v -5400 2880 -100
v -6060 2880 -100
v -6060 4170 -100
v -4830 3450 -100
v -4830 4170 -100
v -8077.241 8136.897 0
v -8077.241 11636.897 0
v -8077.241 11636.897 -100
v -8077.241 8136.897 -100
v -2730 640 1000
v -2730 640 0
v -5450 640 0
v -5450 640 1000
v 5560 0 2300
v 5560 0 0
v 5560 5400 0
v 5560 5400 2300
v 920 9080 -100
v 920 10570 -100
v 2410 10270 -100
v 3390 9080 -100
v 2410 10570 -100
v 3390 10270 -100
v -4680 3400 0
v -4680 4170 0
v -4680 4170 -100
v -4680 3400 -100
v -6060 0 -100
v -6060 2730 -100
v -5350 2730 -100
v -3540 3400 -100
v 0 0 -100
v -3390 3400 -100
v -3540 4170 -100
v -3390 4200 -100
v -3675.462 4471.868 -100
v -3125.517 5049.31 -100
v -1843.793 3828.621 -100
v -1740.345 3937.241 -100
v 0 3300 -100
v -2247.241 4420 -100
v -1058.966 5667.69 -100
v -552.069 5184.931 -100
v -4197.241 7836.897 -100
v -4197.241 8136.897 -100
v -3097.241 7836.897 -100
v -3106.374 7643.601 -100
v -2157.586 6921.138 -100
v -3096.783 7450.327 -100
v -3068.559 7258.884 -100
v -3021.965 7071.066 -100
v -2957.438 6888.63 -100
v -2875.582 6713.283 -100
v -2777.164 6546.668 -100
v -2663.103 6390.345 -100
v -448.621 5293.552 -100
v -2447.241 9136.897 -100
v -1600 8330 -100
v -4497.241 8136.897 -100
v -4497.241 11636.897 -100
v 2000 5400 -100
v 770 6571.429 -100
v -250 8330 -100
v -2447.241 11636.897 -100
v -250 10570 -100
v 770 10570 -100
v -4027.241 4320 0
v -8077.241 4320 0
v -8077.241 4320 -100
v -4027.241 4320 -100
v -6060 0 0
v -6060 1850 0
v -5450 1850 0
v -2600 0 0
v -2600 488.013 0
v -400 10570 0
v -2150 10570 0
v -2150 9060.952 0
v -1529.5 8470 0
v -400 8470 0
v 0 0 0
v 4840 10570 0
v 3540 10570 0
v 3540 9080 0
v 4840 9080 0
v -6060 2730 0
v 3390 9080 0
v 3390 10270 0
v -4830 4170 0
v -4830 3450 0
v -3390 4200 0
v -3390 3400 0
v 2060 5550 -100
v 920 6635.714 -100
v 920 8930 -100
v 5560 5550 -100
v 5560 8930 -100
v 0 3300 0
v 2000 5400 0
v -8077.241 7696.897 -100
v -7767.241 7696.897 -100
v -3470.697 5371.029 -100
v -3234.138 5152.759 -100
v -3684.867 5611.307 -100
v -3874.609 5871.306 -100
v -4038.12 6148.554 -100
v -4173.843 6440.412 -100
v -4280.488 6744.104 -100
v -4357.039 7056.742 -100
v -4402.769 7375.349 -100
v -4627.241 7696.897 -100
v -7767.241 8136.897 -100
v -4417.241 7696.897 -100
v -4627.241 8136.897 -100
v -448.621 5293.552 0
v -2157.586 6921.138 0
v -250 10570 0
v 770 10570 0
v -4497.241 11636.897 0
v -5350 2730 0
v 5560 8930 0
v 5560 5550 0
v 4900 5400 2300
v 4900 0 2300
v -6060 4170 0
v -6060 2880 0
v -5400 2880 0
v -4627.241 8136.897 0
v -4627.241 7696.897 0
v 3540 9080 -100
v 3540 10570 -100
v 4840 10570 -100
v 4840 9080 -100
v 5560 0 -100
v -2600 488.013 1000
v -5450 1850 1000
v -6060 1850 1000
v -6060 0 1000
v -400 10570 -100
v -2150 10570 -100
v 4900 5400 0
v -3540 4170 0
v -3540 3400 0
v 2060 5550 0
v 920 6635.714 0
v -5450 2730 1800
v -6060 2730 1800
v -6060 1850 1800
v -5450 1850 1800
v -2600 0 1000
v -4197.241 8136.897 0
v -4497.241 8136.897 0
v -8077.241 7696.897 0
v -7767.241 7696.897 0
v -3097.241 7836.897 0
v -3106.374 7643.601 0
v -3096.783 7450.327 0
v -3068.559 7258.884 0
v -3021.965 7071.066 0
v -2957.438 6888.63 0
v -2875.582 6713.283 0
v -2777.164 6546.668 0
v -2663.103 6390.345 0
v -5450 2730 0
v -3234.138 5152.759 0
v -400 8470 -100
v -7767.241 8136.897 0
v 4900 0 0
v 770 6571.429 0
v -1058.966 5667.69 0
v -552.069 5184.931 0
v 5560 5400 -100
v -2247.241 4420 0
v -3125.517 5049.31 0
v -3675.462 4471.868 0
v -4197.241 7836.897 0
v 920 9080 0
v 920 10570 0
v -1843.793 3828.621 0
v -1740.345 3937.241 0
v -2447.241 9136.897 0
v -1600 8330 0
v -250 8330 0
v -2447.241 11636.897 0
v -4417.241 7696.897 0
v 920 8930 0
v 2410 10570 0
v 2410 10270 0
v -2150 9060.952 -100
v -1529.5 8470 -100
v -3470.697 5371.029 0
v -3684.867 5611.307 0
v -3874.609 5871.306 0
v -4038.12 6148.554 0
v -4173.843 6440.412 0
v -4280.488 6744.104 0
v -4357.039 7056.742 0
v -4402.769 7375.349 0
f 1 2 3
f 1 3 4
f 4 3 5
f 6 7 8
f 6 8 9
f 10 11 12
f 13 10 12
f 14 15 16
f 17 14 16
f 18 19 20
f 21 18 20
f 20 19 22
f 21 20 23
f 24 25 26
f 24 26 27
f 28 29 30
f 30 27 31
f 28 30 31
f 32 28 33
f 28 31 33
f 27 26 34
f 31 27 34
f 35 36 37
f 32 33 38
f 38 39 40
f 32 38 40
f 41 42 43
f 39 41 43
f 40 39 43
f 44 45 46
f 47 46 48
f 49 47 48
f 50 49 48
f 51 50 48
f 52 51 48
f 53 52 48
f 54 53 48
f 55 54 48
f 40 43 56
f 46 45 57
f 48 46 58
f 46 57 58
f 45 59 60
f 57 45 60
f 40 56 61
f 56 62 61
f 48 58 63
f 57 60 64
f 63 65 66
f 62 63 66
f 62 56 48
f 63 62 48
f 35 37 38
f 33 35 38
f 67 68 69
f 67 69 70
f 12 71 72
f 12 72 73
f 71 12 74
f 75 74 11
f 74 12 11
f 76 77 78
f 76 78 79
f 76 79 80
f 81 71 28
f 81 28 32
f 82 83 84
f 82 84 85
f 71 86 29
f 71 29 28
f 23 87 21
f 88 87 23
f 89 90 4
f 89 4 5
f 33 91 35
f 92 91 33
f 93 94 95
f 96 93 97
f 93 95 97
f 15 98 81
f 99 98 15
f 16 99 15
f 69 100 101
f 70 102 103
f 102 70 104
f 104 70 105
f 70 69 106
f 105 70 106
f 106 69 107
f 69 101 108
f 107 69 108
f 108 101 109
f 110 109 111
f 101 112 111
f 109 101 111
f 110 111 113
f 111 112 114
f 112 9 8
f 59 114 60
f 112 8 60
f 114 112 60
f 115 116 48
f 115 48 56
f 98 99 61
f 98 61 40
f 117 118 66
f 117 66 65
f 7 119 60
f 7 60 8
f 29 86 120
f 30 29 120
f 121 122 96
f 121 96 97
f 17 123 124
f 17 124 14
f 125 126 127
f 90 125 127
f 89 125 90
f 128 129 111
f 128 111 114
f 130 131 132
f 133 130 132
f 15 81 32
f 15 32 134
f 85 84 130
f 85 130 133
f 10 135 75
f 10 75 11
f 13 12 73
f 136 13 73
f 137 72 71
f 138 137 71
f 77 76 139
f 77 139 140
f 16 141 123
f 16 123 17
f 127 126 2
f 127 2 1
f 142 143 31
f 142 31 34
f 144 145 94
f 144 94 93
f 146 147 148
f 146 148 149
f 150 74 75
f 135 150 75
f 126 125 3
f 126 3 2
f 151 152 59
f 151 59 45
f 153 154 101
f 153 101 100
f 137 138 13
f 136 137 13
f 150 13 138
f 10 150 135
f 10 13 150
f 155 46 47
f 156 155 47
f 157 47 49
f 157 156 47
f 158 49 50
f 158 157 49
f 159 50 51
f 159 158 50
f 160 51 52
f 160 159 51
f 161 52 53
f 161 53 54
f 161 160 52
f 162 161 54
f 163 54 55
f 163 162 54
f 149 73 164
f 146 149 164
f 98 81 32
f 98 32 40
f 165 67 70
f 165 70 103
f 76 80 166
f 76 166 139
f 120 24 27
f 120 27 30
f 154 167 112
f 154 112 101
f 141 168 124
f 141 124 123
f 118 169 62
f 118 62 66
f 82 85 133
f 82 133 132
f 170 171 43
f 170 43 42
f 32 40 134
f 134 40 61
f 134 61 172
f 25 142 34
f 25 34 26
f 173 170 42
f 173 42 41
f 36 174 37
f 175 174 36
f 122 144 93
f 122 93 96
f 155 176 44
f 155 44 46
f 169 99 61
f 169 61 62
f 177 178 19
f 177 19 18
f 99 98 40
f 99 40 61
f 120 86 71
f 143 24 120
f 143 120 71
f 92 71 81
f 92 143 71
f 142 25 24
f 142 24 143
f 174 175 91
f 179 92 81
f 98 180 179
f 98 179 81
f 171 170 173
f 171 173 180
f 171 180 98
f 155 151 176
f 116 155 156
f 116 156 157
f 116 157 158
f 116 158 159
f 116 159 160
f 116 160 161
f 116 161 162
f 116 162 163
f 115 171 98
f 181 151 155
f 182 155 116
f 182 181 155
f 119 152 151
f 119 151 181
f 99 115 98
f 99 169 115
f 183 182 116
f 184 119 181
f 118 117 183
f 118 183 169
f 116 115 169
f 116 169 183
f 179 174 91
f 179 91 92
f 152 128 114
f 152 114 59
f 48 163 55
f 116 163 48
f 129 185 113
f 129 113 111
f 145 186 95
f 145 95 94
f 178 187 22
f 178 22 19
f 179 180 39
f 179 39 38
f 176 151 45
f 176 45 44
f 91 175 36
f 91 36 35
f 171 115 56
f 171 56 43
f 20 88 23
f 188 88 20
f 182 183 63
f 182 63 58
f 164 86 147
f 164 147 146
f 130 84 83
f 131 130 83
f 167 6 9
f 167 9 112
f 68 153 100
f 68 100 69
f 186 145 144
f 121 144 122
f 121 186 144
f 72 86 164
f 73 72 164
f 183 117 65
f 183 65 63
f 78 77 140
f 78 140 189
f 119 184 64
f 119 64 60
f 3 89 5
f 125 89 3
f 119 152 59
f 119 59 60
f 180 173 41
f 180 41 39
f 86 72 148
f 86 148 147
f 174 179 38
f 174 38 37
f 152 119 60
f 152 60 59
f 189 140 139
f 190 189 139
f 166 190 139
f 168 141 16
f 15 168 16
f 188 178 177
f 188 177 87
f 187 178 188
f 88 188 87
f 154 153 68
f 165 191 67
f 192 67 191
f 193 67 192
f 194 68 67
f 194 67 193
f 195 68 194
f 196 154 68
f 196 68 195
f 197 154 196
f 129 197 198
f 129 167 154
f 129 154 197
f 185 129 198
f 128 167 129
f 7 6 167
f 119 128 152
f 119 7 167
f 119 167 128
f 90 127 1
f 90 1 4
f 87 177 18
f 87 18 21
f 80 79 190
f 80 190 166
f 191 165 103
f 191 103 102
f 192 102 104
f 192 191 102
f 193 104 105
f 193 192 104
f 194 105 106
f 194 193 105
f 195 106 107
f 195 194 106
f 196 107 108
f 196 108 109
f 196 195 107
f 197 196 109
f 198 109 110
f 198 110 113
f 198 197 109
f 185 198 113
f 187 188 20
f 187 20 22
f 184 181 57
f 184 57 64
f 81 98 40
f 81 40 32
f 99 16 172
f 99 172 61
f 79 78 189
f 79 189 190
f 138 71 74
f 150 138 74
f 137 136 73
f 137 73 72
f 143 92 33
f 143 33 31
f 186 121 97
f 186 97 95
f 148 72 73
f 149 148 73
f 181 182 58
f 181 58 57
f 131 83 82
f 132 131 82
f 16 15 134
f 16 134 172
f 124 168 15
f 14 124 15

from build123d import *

# Parameters (mm, degrees)
F1_DEPTH  = 100
F0_W      = 660
F0_H      = 5400
F2_DEPTH  = 100
F3_DEPTH  = 100
F4_DEPTH  = 100
F5_DEPTH  = 100
F0_W_2    = 1300
F0_H_2    = 1490
F6_DEPTH  = 100
F7_DEPTH  = 100
F0_W_3    = 610
F0_H_3    = 880
F8_DEPTH  = 100
F9_DEPTH  = 1000
F10_DEPTH = 1800
F11_DEPTH = 2300


# Not quite as in the source:
# - a feature names something its author has since deleted; it is built from what else it names


with BuildPart() as f1:
    # F0 (on Top) → F1 (new body)
    with BuildSketch(Plane.XY):
        with BuildLine():
            Line((-2600, 488.0131584643), (-2600, 0))
            Line((-2600, 0), (0, 0))
            Line((0, 0), (0, 3300))
            Line((0, 3300), (2000, 5400))
            Line((2000, 5400), (770, 6571.4285714286))
            Line((770, 6571.4285714286), (770, 10570))
            Line((770, 10570), (-250, 10570))
            Line((-250, 10570), (-250, 8330))
            Line((-250, 8330), (-1600, 8330))
            Line((-1600, 8330), (-2447.2413793103, 9136.8965517241))
            Line((-2447.2413793103, 9136.8965517241), (-2447.2413793103, 11636.8965517241))
            Line((-2447.2413793103, 11636.8965517241), (-4497.2413793103, 11636.8965517241))
            Line((-4497.2413793103, 11636.8965517241), (-4497.2413793103, 8136.8965517241))
            Line((-4497.2413793103, 8136.8965517241), (-4197.2413793103, 8136.8965517241))
            Line((-4197.2413793103, 8136.8965517241), (-4197.2413793103, 7836.8965517241))
            Line((-4197.2413793103, 7836.8965517241), (-3097.2413793103, 7836.8965517241))
            ThreePointArc((-3097.2413793103, 7836.8965517241), (-3021.9650759345, 7071.0659908147), (-2663.1034482759, 6390.3448275862))
            Line((-2663.1034482759, 6390.3448275862), (-2157.5862068966, 6921.1379310345))
            Line((-2157.5862068966, 6921.1379310345), (-448.6206896552, 5293.5517241379))
            Line((-448.6206896552, 5293.5517241379), (-552.0689655172, 5184.9310344828))
            Line((-552.0689655172, 5184.9310344828), (-1058.9655172414, 5667.6896551724))
            Line((-1058.9655172414, 5667.6896551724), (-2247.2413793103, 4420))
            Line((-2247.2413793103, 4420), (-1740.3448275862, 3937.2413793103))
            Line((-1740.3448275862, 3937.2413793103), (-1843.7931034483, 3828.6206896552))
            Line((-1843.7931034483, 3828.6206896552), (-3125.5172413793, 5049.3103448276))
            Line((-3125.5172413793, 5049.3103448276), (-3675.4618885563, 4471.8684652917))
            Line((-3675.4618885563, 4471.8684652917), (-3390, 4200))
            Line((-3390, 4200), (-3390, 3400))
            Line((-3390, 3400), (-3540, 3400))
            Line((-3540, 3400), (-3540, 4170))
            Line((-3540, 4170), (-4680, 4170))
            Line((-4680, 4170), (-4680, 3400))
            Line((-4680, 3400), (-4821.4213562373, 3258.5786437627))
            Line((-4821.4213562373, 3258.5786437627), (-5350, 2730))
            Line((-5350, 2730), (-5450, 2730))
            Line((-5450, 2730), (-5450, 1850))
            Line((-5450, 1850), (-5450, 640))
            Line((-5450, 640), (-2730, 640))
            Line((-2730, 640), (-2600, 488.0131584643))
        make_face()
    extrude(amount=-F1_DEPTH)

    # F0 (on Top) → F8 (join)
    with BuildSketch(Plane.XY):
        Polygon((-6060, 0), (-2600, 0), (-2600, 488.0131584643), (-2730, 640), (-5450, 640), (-5450, 1850), (-6060, 1850), align=None)
        with Locations((-5755, 2290)):
            Rectangle(F0_W_3, F0_H_3)
    extrude(amount=-F8_DEPTH)


with BuildPart() as f1b:
    # F0 (on Top) → F1, piece 2 (new body)
    with BuildSketch(Plane.XY):
        Polygon((-6060, 4170), (-6060, 2880), (-5400, 2880), (-4921.4213562373, 3358.5786437627), (-4830, 3450), (-4830, 4170), (-5900, 4170), align=None)
    extrude(amount=-F1_DEPTH)


with BuildPart() as f2:
    # F0 (on Top) → F2 (new body)
    with BuildSketch(Plane.XY):
        Polygon((0, 3300), (0, 0), (4900, 0), (4900, 5400), (2000, 5400), align=None)
        with Locations((5230, 2700)):
            Rectangle(F0_W, F0_H)
    extrude(amount=-F2_DEPTH)


with BuildPart() as f3:
    # F0 (on Top) → F3 (new body)
    with BuildSketch(Plane.XY):
        with BuildLine():
            Line((-8077.2413793103, 4320), (-6060, 4320))
            Line((-6060, 4320), (-4027.2413793103, 4320))
            Line((-4027.2413793103, 4320), (-3234.1379310345, 5152.7586206897))
            ThreePointArc((-3234.1379310345, 5152.7586206897), (-4109.5423503056, 6292.8272342142), (-4417.2413793103, 7696.8965517241))
            Line((-4417.2413793103, 7696.8965517241), (-4627.2413793103, 7696.8965517241))
            Line((-4627.2413793103, 7696.8965517241), (-4627.2413793103, 8136.8965517241))
            Line((-4627.2413793103, 8136.8965517241), (-4497.2413793103, 8136.8965517241))
            Line((-4497.2413793103, 8136.8965517241), (-4497.2413793103, 11636.8965517241))
            Line((-4497.2413793103, 11636.8965517241), (-8077.2413793103, 11636.8965517241))
            Line((-8077.2413793103, 11636.8965517241), (-8077.2413793103, 8136.8965517241))
            Line((-8077.2413793103, 8136.8965517241), (-7767.2413793103, 8136.8965517241))
            Line((-7767.2413793103, 8136.8965517241), (-7767.2413793103, 7696.8965517241))
            Line((-7767.2413793103, 7696.8965517241), (-8077.2413793103, 7696.8965517241))
            Line((-8077.2413793103, 7696.8965517241), (-8077.2413793103, 4320))
        make_face()
    extrude(amount=-F3_DEPTH)


with BuildPart() as f4:
    # F0 (on Top) → F4 (new body)
    with BuildSketch(Plane.XY):
        Polygon((-400, 8470), (-400, 10570), (-2150, 10570), (-2150, 9060.9523809524), (-1529.5, 8470), align=None)
    extrude(amount=-F4_DEPTH)


with BuildPart() as f5:
    # F0 (on Top) → F5 (new body)
    with BuildSketch(Plane.XY):
        Polygon((4900, 5550), (5560, 5550), (5560, 8930), (920, 8930), (920, 6635.7142857143), (2060, 5550), align=None)
    extrude(amount=-F5_DEPTH)


with BuildPart() as f6:
    # F0 (on Top) → F6 (new body)
    with BuildSketch(Plane.XY):
        with Locations((4190, 9825)):
            Rectangle(F0_W_2, F0_H_2)
    extrude(amount=-F6_DEPTH)


with BuildPart() as f7:
    # F0 (on Top) → F7 (new body)
    with BuildSketch(Plane.XY):
        Polygon((2410, 10570), (920, 10570), (920, 9080), (3390, 9080), (3390, 10270), (2410, 10270), align=None)
    extrude(amount=-F7_DEPTH)


with BuildPart() as f9:
    # F0 (on Top) → F9 (new body)
    with BuildSketch(Plane.XY):
        Polygon((-6060, 0), (-2600, 0), (-2600, 488.0131584643), (-2730, 640), (-5450, 640), (-5450, 1850), (-6060, 1850), align=None)
    extrude(amount=F9_DEPTH)


with BuildPart() as f10:
    # F0 (on Top) → F10 (new body)
    with BuildSketch(Plane.XY):
        with Locations((-5755, 2290)):
            Rectangle(F0_W_3, F0_H_3)
    extrude(amount=F10_DEPTH)


with BuildPart() as f11:
    # F0 (on Top) → F11 (new body)
    with BuildSketch(Plane.XY):
        with Locations((5230, 2700)):
            Rectangle(F0_W, F0_H)
    extrude(amount=F11_DEPTH)


solid = Compound([f1.part, f1b.part, f2.part, f3.part, f4.part, f5.part, f6.part, f7.part, f9.part, f10.part, f11.part])
